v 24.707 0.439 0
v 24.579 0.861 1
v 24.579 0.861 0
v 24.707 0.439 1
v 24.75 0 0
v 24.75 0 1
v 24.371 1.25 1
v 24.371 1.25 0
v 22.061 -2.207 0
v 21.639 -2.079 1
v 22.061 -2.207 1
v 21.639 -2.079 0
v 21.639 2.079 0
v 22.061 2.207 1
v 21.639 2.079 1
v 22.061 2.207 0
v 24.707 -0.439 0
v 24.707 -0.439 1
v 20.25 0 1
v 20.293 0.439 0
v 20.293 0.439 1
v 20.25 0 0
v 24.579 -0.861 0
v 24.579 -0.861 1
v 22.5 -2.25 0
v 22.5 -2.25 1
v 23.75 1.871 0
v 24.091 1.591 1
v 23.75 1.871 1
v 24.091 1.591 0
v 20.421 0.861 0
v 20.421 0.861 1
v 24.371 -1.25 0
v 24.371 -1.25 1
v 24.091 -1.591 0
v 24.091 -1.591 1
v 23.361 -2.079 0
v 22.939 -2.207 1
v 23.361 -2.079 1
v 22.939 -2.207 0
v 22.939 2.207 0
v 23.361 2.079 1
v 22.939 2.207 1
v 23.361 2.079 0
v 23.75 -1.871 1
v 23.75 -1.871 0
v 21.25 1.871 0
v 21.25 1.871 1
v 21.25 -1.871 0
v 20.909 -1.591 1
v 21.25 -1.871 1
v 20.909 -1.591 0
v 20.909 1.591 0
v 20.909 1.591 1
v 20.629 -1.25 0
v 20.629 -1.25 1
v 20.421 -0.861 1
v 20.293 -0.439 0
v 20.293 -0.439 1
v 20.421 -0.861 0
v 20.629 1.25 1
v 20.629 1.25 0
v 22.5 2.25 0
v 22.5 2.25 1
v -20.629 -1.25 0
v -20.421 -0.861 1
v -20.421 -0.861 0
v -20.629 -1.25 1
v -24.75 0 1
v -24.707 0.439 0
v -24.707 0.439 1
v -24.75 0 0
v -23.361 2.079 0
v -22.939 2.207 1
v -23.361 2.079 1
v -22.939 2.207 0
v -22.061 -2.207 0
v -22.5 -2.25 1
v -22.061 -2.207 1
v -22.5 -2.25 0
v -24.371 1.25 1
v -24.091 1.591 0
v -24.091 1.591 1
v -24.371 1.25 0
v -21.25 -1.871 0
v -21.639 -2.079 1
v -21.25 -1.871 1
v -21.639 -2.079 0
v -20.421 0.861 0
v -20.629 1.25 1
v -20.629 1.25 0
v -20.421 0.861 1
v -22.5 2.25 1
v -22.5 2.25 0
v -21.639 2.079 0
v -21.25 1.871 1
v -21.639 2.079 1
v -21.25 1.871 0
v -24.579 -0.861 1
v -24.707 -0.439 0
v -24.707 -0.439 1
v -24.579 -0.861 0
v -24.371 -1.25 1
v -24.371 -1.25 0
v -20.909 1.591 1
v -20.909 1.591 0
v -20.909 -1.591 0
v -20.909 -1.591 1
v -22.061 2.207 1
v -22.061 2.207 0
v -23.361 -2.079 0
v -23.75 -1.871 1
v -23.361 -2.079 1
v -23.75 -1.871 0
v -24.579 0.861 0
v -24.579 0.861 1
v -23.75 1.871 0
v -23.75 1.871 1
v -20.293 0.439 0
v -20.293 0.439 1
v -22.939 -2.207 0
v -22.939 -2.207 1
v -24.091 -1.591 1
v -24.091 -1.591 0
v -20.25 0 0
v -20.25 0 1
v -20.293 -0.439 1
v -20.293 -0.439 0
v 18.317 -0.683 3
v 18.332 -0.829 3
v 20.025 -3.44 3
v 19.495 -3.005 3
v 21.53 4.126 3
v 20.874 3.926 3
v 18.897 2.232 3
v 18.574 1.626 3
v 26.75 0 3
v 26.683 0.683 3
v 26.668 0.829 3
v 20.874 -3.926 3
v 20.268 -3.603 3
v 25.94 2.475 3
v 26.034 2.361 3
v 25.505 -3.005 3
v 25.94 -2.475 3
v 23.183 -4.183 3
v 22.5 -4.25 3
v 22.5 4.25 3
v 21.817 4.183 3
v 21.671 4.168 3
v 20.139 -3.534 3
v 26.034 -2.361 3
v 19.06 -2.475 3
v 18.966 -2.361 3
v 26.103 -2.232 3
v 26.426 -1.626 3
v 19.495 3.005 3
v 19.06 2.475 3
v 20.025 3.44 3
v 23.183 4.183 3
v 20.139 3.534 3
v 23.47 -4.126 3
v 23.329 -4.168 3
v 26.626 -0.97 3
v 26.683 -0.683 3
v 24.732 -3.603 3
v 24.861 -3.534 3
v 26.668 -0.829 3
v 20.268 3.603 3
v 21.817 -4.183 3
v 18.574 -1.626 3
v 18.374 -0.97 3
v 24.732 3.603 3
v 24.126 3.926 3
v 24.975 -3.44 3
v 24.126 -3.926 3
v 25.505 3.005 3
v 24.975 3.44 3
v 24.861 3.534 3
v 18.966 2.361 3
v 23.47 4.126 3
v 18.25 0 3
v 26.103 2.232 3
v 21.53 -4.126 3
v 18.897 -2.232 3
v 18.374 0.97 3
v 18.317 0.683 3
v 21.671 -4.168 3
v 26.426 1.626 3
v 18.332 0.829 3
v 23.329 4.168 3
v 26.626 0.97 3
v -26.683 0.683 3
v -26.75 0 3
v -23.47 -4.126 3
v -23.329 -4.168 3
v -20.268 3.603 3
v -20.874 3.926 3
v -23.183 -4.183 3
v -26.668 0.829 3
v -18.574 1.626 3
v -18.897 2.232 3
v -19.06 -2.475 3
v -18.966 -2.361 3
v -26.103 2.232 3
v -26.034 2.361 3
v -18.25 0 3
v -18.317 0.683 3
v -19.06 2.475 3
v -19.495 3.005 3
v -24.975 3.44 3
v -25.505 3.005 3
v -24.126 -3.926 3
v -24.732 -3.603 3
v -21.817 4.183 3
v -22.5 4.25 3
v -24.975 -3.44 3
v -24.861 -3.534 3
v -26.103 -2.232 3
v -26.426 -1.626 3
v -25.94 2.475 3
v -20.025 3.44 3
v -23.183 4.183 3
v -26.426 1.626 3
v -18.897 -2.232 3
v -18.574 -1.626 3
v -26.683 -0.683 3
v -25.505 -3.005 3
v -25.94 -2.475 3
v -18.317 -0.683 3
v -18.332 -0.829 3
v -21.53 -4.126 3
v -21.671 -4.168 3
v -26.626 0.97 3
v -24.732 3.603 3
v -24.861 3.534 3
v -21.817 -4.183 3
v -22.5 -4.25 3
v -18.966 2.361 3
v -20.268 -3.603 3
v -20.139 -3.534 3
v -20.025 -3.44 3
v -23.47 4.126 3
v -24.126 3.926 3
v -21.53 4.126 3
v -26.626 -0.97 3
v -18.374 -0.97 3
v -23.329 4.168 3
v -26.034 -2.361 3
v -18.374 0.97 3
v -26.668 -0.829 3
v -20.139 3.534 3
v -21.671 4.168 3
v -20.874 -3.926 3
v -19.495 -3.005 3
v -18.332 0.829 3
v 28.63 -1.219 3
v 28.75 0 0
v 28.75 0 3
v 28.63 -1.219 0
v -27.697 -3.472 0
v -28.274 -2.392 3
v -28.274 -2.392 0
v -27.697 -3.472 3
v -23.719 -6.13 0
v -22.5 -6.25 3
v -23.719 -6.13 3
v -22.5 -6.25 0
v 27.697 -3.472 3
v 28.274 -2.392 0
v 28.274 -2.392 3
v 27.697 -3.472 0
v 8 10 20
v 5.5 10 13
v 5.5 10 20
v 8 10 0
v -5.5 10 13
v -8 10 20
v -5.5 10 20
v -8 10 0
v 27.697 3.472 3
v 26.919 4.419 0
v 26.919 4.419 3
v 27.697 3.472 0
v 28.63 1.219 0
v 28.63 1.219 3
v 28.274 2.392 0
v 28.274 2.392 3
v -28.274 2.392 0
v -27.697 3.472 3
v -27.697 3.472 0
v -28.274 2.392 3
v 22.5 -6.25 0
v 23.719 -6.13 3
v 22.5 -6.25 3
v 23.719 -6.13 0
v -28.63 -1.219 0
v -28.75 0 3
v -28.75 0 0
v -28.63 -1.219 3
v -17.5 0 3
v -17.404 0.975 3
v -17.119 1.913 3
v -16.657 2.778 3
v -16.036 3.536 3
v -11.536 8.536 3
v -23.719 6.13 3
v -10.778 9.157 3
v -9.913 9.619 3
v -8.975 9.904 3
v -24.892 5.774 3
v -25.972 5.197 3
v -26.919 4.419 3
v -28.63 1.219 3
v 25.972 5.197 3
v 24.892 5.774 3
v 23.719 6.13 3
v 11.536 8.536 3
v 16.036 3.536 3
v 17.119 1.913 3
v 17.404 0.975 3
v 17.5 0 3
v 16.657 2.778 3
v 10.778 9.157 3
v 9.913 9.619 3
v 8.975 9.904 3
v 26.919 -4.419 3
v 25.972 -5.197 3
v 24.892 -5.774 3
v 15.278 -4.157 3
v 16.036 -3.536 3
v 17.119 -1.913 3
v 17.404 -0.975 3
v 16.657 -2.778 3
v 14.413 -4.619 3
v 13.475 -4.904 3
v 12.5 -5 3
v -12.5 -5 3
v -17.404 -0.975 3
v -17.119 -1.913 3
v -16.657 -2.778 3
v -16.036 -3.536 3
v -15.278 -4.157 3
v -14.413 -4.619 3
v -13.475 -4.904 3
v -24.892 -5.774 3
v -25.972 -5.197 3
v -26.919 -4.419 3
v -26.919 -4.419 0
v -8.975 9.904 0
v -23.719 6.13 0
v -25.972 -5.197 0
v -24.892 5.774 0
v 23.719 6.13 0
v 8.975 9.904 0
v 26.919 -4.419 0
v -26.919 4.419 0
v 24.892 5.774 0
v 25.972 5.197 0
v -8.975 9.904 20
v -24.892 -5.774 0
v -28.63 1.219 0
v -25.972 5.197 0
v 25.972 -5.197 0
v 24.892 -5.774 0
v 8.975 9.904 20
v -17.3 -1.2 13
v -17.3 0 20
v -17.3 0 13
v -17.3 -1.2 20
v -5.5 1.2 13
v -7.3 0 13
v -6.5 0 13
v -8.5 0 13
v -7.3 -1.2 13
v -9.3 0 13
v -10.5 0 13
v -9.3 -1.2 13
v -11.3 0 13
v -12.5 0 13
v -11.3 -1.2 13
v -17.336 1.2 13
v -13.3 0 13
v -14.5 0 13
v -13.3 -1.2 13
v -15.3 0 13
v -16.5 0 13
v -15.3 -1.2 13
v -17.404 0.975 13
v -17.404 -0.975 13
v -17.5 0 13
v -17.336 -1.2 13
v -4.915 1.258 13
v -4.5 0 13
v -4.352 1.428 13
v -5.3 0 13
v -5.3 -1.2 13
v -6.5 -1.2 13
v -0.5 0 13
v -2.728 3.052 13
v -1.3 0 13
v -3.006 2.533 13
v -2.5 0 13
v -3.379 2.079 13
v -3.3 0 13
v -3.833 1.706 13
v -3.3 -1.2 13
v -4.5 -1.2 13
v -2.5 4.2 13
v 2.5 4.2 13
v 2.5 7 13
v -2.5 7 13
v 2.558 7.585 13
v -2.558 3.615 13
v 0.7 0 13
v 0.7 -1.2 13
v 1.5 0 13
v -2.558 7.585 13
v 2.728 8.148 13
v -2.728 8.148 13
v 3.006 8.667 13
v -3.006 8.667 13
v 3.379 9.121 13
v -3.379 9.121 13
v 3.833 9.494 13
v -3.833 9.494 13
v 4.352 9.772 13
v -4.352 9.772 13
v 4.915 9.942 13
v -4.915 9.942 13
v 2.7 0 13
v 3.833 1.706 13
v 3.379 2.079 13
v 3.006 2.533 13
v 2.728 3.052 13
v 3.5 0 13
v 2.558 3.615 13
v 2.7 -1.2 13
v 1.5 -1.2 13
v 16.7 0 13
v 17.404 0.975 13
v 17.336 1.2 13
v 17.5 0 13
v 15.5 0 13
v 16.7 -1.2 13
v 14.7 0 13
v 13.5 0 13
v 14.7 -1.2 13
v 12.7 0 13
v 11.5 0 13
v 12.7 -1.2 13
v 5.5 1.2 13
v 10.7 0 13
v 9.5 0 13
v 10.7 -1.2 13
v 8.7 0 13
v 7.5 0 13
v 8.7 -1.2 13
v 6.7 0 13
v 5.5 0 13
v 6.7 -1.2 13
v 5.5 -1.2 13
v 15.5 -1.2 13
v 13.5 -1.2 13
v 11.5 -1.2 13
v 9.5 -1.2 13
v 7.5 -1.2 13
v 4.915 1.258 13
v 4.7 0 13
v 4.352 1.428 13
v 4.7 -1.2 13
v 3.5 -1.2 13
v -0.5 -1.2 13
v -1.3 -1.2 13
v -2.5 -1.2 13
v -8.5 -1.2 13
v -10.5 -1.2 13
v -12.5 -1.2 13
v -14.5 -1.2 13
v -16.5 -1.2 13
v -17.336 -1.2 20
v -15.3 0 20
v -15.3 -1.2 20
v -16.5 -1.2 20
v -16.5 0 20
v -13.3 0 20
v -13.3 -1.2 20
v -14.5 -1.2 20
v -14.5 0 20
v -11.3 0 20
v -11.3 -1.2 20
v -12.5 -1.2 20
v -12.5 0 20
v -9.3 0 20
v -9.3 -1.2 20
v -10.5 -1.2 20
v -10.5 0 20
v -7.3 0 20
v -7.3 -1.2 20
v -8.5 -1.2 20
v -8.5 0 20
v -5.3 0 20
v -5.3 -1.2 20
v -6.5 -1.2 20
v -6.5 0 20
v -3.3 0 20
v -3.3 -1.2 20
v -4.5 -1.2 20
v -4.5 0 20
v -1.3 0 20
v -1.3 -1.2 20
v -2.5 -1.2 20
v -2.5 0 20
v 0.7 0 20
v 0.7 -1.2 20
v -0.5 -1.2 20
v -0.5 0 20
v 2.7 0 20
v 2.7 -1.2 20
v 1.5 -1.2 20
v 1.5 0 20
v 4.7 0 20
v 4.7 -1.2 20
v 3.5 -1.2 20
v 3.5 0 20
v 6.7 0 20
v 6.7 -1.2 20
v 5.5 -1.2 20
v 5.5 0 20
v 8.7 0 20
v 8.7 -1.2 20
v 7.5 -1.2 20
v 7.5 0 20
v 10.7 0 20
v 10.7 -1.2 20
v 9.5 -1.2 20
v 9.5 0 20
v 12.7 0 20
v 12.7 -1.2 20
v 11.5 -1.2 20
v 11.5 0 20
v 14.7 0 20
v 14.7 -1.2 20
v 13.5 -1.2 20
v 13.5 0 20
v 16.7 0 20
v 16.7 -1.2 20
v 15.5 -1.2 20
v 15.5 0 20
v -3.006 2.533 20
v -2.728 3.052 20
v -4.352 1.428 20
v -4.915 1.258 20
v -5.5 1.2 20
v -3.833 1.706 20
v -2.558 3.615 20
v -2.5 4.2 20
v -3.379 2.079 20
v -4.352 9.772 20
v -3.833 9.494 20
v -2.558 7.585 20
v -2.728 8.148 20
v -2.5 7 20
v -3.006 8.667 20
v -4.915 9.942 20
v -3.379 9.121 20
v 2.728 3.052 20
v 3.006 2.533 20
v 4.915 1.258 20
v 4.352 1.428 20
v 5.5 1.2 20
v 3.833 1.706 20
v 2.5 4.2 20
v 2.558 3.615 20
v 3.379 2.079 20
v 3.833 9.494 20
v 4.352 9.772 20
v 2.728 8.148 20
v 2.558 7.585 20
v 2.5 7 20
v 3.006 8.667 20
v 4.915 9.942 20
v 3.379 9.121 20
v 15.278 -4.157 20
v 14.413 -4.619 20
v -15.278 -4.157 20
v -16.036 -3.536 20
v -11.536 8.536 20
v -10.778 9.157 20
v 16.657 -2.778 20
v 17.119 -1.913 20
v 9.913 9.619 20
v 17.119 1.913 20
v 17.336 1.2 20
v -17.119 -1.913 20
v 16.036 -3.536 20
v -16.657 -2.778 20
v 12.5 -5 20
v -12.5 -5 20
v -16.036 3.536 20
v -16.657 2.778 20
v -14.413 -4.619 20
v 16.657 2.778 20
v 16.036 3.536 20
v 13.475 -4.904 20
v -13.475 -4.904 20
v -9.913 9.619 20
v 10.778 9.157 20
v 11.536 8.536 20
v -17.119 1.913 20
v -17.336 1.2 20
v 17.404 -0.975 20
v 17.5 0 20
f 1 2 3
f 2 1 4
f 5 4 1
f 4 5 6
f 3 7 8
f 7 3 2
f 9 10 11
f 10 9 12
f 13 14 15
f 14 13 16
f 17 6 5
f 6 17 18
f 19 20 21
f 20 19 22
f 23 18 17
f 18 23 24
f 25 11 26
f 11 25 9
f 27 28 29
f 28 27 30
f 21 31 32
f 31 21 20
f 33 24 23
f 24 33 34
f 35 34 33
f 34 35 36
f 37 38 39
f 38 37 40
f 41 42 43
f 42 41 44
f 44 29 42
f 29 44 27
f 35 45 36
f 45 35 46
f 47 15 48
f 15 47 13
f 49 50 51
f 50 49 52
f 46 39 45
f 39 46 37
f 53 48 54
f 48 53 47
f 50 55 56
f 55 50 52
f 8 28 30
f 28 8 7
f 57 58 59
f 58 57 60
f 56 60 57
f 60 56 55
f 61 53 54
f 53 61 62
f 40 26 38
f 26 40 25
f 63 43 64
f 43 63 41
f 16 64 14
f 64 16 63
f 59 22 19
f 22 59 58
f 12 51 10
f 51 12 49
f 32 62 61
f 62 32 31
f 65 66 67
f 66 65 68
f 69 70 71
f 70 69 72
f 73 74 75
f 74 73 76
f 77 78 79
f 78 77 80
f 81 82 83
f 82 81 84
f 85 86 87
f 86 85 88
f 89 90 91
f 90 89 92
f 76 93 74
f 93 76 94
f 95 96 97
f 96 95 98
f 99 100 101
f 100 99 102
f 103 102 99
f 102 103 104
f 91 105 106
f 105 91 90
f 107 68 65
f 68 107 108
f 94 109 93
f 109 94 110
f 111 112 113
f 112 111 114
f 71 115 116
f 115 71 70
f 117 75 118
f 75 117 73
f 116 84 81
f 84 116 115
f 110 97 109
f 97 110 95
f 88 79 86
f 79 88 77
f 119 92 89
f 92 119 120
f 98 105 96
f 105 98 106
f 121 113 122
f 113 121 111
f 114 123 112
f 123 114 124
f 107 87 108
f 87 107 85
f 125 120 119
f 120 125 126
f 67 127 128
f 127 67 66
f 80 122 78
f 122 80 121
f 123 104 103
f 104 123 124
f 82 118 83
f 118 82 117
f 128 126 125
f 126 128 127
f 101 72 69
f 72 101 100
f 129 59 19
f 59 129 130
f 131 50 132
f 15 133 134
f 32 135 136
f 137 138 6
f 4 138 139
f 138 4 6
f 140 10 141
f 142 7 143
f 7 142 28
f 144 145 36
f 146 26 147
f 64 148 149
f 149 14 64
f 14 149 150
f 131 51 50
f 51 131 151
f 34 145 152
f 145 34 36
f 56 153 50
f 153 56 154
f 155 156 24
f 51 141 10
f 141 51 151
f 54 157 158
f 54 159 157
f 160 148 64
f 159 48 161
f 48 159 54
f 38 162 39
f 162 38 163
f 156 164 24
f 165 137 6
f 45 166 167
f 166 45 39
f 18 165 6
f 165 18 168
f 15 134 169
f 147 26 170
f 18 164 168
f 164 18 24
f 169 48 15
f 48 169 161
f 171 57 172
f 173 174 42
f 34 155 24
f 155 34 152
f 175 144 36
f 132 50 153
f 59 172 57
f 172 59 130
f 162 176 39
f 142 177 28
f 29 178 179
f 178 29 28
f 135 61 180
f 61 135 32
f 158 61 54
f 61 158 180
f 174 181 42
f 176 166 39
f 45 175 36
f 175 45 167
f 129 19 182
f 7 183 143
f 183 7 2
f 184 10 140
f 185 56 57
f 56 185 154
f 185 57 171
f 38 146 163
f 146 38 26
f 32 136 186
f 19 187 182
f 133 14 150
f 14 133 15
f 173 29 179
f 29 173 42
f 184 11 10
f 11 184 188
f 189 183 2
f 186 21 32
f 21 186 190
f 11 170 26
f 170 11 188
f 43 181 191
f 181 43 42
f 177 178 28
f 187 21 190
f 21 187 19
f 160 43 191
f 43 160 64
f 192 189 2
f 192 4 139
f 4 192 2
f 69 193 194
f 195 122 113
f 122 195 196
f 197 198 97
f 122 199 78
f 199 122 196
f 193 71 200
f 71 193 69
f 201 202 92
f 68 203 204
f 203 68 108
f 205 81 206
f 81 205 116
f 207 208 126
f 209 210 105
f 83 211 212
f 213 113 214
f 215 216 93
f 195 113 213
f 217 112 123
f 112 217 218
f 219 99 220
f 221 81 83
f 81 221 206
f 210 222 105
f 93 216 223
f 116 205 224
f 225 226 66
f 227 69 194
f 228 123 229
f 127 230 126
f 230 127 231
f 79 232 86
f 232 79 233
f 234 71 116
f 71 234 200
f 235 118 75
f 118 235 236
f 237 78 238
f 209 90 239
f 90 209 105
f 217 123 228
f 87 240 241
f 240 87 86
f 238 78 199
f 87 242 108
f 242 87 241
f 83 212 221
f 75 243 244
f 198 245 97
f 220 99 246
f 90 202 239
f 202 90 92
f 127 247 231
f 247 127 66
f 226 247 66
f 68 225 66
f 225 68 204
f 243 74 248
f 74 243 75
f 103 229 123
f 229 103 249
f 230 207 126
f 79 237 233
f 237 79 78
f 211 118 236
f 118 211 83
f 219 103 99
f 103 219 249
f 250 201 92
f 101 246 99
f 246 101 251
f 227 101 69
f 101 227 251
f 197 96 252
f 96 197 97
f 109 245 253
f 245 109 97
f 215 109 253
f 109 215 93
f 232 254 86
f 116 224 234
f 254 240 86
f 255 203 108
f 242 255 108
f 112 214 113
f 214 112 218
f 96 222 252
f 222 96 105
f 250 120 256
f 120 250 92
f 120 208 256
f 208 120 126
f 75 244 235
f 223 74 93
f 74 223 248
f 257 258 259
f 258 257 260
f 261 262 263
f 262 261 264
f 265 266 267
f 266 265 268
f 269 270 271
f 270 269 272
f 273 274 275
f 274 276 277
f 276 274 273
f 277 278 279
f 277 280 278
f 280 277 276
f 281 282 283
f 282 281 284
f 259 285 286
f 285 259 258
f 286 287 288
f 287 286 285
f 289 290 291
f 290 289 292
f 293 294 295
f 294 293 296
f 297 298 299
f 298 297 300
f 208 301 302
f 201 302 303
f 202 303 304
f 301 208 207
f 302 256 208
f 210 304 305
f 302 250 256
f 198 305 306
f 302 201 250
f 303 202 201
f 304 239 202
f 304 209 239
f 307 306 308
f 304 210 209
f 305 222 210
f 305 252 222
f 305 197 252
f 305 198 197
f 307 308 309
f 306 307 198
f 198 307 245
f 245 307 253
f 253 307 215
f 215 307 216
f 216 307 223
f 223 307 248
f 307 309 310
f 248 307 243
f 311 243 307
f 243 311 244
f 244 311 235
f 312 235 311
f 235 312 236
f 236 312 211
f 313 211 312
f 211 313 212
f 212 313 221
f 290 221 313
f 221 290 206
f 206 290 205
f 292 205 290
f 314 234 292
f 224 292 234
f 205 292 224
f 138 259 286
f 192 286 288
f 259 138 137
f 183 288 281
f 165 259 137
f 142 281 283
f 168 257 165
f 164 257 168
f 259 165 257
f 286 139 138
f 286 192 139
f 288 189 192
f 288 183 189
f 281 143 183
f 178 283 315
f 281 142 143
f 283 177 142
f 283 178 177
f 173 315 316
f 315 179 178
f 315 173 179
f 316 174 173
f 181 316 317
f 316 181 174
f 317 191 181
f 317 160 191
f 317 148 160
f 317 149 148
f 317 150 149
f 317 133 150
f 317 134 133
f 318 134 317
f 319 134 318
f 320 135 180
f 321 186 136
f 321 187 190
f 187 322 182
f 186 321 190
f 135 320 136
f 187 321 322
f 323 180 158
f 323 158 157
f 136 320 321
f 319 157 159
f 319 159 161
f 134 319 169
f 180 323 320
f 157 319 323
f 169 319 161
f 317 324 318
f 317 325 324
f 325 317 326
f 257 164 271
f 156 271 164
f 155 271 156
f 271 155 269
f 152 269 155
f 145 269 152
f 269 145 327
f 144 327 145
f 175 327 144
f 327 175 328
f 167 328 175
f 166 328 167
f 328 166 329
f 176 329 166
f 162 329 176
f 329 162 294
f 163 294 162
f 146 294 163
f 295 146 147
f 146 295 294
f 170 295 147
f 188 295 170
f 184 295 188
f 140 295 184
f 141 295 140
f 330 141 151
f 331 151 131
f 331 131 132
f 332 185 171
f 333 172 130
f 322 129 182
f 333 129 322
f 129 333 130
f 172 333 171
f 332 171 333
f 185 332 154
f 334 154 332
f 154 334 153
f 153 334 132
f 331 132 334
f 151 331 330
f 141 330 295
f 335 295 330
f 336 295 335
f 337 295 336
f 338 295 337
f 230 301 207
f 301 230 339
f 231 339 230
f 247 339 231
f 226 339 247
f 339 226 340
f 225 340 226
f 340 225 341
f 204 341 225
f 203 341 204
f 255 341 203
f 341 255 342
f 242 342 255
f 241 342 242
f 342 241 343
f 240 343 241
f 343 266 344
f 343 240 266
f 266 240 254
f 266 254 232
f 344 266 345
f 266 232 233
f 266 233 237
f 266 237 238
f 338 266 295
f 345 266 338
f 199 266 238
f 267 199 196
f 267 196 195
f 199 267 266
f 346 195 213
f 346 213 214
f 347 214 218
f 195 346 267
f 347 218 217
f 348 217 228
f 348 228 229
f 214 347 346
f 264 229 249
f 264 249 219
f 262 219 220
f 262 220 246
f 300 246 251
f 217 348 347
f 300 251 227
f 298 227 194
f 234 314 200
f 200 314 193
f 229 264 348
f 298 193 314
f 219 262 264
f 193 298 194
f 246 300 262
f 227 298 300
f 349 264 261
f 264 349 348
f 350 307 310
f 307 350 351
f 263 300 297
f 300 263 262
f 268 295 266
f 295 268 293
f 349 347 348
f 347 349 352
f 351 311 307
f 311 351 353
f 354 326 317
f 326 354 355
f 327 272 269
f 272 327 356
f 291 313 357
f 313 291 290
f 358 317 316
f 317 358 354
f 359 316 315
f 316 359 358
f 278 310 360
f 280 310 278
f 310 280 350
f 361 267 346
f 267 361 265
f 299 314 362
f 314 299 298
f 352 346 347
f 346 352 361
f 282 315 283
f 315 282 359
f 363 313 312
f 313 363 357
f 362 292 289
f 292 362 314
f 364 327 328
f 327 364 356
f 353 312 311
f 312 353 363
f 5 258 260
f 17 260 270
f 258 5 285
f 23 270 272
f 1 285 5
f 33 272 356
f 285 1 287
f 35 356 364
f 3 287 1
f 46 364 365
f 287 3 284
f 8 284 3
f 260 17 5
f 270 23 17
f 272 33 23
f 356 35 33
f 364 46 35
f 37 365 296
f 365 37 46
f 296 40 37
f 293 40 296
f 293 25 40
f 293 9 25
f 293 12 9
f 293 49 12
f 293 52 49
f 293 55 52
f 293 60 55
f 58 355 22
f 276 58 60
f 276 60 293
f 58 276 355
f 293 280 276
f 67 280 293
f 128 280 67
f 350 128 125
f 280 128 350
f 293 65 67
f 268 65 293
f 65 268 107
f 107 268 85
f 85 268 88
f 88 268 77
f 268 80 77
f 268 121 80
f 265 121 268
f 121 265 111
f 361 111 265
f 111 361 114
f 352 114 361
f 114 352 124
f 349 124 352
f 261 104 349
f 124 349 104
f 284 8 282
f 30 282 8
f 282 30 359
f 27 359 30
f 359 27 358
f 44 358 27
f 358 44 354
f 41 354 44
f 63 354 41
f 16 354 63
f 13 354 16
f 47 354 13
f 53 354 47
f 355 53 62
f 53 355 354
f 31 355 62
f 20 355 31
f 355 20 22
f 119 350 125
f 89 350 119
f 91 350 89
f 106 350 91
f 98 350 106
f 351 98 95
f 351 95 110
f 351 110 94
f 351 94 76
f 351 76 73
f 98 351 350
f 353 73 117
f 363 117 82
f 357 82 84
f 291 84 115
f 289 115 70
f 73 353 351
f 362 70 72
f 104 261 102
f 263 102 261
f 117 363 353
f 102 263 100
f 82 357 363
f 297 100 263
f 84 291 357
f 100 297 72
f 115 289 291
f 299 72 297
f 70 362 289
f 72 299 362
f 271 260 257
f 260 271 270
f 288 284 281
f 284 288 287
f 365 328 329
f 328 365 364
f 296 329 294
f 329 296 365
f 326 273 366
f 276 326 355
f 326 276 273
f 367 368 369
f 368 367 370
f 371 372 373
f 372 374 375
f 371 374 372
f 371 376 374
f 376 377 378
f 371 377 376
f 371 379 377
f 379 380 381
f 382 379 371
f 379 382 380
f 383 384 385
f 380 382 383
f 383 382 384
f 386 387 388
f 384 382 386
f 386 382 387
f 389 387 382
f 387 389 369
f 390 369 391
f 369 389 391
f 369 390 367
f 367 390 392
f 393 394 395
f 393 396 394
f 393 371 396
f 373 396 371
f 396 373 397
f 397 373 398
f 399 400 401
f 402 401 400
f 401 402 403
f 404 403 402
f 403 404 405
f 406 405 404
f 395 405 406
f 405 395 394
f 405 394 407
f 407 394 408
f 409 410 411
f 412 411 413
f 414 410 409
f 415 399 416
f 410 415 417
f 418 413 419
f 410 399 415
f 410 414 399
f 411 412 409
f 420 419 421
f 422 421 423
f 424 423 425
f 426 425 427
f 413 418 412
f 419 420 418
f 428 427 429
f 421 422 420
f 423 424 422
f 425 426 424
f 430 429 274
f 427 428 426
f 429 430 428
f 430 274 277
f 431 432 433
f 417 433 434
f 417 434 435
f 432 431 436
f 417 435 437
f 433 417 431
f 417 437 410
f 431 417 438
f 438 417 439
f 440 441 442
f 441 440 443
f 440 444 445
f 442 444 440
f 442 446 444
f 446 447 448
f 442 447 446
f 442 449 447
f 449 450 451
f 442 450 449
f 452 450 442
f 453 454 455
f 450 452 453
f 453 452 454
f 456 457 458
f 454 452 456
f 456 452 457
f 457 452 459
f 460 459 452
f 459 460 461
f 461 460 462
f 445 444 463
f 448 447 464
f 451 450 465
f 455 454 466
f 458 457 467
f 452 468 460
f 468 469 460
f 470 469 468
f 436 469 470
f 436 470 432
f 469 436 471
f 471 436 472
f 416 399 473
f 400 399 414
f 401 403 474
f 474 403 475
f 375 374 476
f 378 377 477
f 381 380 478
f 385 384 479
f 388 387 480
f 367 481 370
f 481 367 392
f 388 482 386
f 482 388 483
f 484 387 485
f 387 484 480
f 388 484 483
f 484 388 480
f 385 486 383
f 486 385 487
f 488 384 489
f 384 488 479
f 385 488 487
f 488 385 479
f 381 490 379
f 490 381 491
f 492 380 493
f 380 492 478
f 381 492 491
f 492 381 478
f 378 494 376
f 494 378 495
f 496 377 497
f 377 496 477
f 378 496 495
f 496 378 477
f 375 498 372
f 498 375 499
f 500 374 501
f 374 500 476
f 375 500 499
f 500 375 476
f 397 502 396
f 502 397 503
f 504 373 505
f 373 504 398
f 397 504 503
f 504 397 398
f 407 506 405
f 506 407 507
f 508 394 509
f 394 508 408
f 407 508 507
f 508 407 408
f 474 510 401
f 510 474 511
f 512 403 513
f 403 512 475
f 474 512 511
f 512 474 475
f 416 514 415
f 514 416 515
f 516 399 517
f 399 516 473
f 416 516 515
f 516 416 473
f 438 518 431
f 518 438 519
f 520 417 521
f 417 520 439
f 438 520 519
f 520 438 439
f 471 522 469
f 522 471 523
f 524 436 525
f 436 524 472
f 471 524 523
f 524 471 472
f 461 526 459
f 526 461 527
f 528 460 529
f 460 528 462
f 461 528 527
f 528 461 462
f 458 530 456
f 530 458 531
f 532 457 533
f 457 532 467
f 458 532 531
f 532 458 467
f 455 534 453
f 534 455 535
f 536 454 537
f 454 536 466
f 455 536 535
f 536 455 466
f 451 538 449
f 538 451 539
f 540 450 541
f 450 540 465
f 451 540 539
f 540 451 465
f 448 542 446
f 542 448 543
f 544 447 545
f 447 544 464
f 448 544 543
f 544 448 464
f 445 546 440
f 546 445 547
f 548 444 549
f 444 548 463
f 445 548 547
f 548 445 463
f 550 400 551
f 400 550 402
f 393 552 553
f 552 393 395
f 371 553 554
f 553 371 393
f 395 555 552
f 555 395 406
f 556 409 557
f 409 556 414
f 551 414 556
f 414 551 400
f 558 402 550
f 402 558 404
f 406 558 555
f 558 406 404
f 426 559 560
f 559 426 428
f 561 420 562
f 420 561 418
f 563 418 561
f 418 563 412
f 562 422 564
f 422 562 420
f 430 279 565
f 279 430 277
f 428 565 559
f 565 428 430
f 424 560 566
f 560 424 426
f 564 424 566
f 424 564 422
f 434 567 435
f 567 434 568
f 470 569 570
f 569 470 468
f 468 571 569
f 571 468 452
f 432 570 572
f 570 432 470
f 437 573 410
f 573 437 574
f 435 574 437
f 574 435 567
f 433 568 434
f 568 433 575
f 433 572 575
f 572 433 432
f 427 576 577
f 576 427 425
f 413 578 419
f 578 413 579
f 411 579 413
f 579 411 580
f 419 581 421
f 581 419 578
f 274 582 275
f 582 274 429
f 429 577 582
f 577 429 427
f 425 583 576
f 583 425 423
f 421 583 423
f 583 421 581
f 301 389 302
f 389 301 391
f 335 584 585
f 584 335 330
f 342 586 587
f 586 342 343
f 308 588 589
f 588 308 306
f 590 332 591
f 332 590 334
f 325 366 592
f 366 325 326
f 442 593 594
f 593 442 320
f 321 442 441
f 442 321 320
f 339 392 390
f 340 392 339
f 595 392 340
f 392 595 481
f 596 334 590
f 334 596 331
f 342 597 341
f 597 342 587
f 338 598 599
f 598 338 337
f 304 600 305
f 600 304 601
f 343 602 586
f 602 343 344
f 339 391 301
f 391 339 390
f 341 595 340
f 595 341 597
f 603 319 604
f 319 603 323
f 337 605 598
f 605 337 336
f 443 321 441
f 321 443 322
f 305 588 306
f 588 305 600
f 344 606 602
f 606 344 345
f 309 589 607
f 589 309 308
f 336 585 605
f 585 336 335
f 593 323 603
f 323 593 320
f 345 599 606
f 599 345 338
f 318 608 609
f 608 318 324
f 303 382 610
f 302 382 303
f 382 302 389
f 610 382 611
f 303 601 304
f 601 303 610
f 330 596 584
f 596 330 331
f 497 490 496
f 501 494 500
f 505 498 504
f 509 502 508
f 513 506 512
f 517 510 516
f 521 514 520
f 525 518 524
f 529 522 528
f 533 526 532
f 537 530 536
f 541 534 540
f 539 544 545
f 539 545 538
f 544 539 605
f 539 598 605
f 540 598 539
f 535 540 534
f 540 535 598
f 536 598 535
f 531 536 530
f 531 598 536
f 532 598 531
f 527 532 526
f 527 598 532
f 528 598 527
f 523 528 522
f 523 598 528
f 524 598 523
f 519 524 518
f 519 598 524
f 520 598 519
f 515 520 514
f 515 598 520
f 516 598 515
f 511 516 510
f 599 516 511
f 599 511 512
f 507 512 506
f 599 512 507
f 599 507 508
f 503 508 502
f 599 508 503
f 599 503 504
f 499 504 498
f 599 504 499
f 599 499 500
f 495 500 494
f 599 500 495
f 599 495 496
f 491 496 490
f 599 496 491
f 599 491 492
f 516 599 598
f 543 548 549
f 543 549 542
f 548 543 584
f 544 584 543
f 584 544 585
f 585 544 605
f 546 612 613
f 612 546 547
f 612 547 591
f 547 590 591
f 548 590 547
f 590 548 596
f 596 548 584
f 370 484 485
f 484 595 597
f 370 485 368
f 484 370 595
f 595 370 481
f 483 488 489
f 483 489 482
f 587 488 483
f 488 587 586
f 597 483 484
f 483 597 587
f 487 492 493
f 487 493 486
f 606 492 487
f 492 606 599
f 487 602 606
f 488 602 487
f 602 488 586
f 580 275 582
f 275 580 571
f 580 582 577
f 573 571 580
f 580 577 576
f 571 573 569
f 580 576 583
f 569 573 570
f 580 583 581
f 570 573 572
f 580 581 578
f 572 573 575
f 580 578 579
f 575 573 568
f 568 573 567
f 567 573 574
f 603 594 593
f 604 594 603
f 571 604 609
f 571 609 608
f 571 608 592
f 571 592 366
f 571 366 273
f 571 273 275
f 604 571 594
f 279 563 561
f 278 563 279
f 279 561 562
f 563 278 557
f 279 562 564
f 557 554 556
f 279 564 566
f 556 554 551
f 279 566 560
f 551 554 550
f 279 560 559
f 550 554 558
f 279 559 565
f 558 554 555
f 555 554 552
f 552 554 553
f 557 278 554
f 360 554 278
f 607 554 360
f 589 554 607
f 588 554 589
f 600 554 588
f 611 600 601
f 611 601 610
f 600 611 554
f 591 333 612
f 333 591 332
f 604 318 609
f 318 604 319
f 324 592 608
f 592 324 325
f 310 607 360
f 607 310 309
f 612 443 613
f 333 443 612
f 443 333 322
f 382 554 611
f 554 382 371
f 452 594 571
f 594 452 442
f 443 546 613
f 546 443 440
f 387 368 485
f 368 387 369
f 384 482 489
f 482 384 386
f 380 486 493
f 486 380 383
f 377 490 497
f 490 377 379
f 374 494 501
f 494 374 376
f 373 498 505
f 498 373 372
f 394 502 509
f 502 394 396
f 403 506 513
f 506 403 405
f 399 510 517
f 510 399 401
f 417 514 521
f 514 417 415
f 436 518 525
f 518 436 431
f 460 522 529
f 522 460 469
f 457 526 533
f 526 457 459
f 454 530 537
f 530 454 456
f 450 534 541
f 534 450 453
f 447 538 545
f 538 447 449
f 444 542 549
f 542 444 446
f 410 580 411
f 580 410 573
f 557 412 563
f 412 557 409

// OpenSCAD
// file: modules.scad
// Fonctions personnalisées

//http://forum.openscad.org/Wish-mirror-copy-true-td10681.html
module copy_mirror(vec=[0,1,0])
{
    children();
    mirror(vec) children();
}

module ecrou(plat,h){
  cylinder(d=plat*2/sqrt(3), h=h, $fn=6);
}


module courroie(diam,longueur){
  color ("black")
  difference(){
    hull(){
      cylinder(d=diam+1, h=6, $fn=32);
      translate([longueur,0,0]) cylinder(d=diam+1, h=6, $fn=32);
    }
    translate([0,0,-1])
    hull(){
      cylinder(d=diam-1, h=8, $fn=32);
      translate([longueur,0,0]) cylinder(d=diam-1, h=8, $fn=32);
    }
  }
  
  
}
// file: config.scad
// Paramètres de la machine

decal=-30;            // décallage du chassis xz
hauteur=400;          // hauteur totale chassis
largeur=400;          // largeur totale chassis
longueur=470;         // longueur totale chassis
hauteur_base=90;      // hauteur de la base
entraxe_y=140;        // distance entre les tiges Ø8 axe Y
entraxe_x=45;         // distance entre les tiges Ø8 axe X

couleur=[1,0.6,0];



// Paramètre des pièces et jeux

// écart plateau/courroie
// y_belt_holder
belt_h=13;      // écart entre la courroie et le plateau

// écart plateau/tiges lisses
// y_lm8uu
decal_plateau=12; // Décallage en Y

// décallage des tiges lisses Y
// support_tige8_y
decal_tiges=5;

// décallage moteur Y
// y_motor
decal_motory_z=11;
decal_motory_y=25;

// Equerres de fixation position fermée
eq_ec=10;      // écart entre profilés

// Fixations axe Z
pos_z=26;      // position des axes par rapport au profilé (>= 21)
hauteur_z=20;  // hauteur des fixations
entraxe_z=17;  // distance entre les tiges Ø8 et M5
// est ce que la tige de 8 dépasse du profilé de 30?
// si oui, on décale les fixations
decalx=max(-42/2+entraxe_z+8/2+2, 0);

// Roulements linéaires
lbd = 15; // diamètre ext
lbh = 24; // hauteur

// x_carriage
he_x=23;  // entraxe hotend x
he_y=23;  // entraxe hotend y
sen_x=13; // entraxe capteur x
sen_y=23; // entraxe capteur y

// Plats écrous
ec3=5.7;
ec4=7.2;
ec5=8.2;
ec6=10.2;

// Jeu sur plats pour les écrous glissants
jec=0.2;

// hauteur écrous
ec3h=2.4;
ec4h=3.2;
ec5h=4.7;
ec6h=5.2;

// Vis
vis3=3.5;
vis4=4.5;
vis5=5.5;
vis6=6.5;

// nombre de dents des poulies
poulie=20;

// Pas des courroies
pas=2;

// diamètre des poulies
dpoulie=poulie*pas/3.1416;
// main file
// eLKa1
// belt_holder
// GNU GPL v3
// lkiefer <blog.lkiefer.org> and contributors
// http://www.reprap.org/wiki/ELKa
// https://github.com/kimented/elka1

// Pour courroie GT2
include <config.scad>;
use <modules.scad>;

module y_belt_holder(){
  ep=3;           // épaisseur
  vis=vis4;       // vis de fixation
  entraxe=45;     // entraxe des vis
  rayon=3;        // arrondis
  longueur=35;    // longueur des attaches
  diam=10;        // diamètre des attaches

  largeur=5;      // largeur supplémentaire du corps
  $fn=32;
  
  echo ("y_belt_holder");

  color(couleur){
    difference(){
    // platine
      hull() {
        copy_mirror([1,0,0]) translate([entraxe/2,0,0]) cylinder(d=vis+8,h=ep);
        //#copy_mirror([1,0,0]) translate([longueur/2-diam/2,largeur,0]) cylinder(d=diam,h=ep);
        copy_mirror([1,0,0]) translate([8,largeur,0]) cylinder(d=diam,h=ep);
      }
      // trous des vis
      copy_mirror([1,0,0]) translate([entraxe/2,0,-1]) cylinder(d=vis,h=ep+2);
      copy_mirror([1,0,0]) translate([entraxe/2,0,ep-2]) cylinder(d1=vis, d2=vis+6,h=3);
    }

    // corps
    difference(){
      hull() {
        copy_mirror([1,0,0]) translate([longueur/2-diam/2,0,0]) cylinder(d=diam,h=belt_h+7);
        copy_mirror([1,0,0]) translate([8,largeur,0]) cylinder(d=diam,h=belt_h+7);
      }
      // courroie
      translate([-longueur/2-1,0,belt_h]) cube([longueur+2,1.2,7+1]);
      // dents
      for (i=[0:2:longueur]){
        translate([-longueur/2-1+i,0-1.2,belt_h]) cube([1.2,1.2+1,7+1]);
      }
      translate([-5/2,0,belt_h]) cube([5,largeur+diam/2+1,7+1]);
      
      copy_mirror([1,0,0]){
        translate([-5/2-rayon,rayon+1.2,belt_h])
        rotate([0,0,-90])
        difference(){
          cube([rayon+1,rayon+1,7+1]);
          cylinder(r=rayon,h=7+1);
        }
        translate([-5/2-rayon,diam/2+largeur-rayon,belt_h])
        //rotate([0,0,-90])
        difference(){
          cube([rayon+1,rayon+1,7+1]);
          cylinder(r=rayon,h=7+1);
        }
      }
    }
  }
}

y_belt_holder();
